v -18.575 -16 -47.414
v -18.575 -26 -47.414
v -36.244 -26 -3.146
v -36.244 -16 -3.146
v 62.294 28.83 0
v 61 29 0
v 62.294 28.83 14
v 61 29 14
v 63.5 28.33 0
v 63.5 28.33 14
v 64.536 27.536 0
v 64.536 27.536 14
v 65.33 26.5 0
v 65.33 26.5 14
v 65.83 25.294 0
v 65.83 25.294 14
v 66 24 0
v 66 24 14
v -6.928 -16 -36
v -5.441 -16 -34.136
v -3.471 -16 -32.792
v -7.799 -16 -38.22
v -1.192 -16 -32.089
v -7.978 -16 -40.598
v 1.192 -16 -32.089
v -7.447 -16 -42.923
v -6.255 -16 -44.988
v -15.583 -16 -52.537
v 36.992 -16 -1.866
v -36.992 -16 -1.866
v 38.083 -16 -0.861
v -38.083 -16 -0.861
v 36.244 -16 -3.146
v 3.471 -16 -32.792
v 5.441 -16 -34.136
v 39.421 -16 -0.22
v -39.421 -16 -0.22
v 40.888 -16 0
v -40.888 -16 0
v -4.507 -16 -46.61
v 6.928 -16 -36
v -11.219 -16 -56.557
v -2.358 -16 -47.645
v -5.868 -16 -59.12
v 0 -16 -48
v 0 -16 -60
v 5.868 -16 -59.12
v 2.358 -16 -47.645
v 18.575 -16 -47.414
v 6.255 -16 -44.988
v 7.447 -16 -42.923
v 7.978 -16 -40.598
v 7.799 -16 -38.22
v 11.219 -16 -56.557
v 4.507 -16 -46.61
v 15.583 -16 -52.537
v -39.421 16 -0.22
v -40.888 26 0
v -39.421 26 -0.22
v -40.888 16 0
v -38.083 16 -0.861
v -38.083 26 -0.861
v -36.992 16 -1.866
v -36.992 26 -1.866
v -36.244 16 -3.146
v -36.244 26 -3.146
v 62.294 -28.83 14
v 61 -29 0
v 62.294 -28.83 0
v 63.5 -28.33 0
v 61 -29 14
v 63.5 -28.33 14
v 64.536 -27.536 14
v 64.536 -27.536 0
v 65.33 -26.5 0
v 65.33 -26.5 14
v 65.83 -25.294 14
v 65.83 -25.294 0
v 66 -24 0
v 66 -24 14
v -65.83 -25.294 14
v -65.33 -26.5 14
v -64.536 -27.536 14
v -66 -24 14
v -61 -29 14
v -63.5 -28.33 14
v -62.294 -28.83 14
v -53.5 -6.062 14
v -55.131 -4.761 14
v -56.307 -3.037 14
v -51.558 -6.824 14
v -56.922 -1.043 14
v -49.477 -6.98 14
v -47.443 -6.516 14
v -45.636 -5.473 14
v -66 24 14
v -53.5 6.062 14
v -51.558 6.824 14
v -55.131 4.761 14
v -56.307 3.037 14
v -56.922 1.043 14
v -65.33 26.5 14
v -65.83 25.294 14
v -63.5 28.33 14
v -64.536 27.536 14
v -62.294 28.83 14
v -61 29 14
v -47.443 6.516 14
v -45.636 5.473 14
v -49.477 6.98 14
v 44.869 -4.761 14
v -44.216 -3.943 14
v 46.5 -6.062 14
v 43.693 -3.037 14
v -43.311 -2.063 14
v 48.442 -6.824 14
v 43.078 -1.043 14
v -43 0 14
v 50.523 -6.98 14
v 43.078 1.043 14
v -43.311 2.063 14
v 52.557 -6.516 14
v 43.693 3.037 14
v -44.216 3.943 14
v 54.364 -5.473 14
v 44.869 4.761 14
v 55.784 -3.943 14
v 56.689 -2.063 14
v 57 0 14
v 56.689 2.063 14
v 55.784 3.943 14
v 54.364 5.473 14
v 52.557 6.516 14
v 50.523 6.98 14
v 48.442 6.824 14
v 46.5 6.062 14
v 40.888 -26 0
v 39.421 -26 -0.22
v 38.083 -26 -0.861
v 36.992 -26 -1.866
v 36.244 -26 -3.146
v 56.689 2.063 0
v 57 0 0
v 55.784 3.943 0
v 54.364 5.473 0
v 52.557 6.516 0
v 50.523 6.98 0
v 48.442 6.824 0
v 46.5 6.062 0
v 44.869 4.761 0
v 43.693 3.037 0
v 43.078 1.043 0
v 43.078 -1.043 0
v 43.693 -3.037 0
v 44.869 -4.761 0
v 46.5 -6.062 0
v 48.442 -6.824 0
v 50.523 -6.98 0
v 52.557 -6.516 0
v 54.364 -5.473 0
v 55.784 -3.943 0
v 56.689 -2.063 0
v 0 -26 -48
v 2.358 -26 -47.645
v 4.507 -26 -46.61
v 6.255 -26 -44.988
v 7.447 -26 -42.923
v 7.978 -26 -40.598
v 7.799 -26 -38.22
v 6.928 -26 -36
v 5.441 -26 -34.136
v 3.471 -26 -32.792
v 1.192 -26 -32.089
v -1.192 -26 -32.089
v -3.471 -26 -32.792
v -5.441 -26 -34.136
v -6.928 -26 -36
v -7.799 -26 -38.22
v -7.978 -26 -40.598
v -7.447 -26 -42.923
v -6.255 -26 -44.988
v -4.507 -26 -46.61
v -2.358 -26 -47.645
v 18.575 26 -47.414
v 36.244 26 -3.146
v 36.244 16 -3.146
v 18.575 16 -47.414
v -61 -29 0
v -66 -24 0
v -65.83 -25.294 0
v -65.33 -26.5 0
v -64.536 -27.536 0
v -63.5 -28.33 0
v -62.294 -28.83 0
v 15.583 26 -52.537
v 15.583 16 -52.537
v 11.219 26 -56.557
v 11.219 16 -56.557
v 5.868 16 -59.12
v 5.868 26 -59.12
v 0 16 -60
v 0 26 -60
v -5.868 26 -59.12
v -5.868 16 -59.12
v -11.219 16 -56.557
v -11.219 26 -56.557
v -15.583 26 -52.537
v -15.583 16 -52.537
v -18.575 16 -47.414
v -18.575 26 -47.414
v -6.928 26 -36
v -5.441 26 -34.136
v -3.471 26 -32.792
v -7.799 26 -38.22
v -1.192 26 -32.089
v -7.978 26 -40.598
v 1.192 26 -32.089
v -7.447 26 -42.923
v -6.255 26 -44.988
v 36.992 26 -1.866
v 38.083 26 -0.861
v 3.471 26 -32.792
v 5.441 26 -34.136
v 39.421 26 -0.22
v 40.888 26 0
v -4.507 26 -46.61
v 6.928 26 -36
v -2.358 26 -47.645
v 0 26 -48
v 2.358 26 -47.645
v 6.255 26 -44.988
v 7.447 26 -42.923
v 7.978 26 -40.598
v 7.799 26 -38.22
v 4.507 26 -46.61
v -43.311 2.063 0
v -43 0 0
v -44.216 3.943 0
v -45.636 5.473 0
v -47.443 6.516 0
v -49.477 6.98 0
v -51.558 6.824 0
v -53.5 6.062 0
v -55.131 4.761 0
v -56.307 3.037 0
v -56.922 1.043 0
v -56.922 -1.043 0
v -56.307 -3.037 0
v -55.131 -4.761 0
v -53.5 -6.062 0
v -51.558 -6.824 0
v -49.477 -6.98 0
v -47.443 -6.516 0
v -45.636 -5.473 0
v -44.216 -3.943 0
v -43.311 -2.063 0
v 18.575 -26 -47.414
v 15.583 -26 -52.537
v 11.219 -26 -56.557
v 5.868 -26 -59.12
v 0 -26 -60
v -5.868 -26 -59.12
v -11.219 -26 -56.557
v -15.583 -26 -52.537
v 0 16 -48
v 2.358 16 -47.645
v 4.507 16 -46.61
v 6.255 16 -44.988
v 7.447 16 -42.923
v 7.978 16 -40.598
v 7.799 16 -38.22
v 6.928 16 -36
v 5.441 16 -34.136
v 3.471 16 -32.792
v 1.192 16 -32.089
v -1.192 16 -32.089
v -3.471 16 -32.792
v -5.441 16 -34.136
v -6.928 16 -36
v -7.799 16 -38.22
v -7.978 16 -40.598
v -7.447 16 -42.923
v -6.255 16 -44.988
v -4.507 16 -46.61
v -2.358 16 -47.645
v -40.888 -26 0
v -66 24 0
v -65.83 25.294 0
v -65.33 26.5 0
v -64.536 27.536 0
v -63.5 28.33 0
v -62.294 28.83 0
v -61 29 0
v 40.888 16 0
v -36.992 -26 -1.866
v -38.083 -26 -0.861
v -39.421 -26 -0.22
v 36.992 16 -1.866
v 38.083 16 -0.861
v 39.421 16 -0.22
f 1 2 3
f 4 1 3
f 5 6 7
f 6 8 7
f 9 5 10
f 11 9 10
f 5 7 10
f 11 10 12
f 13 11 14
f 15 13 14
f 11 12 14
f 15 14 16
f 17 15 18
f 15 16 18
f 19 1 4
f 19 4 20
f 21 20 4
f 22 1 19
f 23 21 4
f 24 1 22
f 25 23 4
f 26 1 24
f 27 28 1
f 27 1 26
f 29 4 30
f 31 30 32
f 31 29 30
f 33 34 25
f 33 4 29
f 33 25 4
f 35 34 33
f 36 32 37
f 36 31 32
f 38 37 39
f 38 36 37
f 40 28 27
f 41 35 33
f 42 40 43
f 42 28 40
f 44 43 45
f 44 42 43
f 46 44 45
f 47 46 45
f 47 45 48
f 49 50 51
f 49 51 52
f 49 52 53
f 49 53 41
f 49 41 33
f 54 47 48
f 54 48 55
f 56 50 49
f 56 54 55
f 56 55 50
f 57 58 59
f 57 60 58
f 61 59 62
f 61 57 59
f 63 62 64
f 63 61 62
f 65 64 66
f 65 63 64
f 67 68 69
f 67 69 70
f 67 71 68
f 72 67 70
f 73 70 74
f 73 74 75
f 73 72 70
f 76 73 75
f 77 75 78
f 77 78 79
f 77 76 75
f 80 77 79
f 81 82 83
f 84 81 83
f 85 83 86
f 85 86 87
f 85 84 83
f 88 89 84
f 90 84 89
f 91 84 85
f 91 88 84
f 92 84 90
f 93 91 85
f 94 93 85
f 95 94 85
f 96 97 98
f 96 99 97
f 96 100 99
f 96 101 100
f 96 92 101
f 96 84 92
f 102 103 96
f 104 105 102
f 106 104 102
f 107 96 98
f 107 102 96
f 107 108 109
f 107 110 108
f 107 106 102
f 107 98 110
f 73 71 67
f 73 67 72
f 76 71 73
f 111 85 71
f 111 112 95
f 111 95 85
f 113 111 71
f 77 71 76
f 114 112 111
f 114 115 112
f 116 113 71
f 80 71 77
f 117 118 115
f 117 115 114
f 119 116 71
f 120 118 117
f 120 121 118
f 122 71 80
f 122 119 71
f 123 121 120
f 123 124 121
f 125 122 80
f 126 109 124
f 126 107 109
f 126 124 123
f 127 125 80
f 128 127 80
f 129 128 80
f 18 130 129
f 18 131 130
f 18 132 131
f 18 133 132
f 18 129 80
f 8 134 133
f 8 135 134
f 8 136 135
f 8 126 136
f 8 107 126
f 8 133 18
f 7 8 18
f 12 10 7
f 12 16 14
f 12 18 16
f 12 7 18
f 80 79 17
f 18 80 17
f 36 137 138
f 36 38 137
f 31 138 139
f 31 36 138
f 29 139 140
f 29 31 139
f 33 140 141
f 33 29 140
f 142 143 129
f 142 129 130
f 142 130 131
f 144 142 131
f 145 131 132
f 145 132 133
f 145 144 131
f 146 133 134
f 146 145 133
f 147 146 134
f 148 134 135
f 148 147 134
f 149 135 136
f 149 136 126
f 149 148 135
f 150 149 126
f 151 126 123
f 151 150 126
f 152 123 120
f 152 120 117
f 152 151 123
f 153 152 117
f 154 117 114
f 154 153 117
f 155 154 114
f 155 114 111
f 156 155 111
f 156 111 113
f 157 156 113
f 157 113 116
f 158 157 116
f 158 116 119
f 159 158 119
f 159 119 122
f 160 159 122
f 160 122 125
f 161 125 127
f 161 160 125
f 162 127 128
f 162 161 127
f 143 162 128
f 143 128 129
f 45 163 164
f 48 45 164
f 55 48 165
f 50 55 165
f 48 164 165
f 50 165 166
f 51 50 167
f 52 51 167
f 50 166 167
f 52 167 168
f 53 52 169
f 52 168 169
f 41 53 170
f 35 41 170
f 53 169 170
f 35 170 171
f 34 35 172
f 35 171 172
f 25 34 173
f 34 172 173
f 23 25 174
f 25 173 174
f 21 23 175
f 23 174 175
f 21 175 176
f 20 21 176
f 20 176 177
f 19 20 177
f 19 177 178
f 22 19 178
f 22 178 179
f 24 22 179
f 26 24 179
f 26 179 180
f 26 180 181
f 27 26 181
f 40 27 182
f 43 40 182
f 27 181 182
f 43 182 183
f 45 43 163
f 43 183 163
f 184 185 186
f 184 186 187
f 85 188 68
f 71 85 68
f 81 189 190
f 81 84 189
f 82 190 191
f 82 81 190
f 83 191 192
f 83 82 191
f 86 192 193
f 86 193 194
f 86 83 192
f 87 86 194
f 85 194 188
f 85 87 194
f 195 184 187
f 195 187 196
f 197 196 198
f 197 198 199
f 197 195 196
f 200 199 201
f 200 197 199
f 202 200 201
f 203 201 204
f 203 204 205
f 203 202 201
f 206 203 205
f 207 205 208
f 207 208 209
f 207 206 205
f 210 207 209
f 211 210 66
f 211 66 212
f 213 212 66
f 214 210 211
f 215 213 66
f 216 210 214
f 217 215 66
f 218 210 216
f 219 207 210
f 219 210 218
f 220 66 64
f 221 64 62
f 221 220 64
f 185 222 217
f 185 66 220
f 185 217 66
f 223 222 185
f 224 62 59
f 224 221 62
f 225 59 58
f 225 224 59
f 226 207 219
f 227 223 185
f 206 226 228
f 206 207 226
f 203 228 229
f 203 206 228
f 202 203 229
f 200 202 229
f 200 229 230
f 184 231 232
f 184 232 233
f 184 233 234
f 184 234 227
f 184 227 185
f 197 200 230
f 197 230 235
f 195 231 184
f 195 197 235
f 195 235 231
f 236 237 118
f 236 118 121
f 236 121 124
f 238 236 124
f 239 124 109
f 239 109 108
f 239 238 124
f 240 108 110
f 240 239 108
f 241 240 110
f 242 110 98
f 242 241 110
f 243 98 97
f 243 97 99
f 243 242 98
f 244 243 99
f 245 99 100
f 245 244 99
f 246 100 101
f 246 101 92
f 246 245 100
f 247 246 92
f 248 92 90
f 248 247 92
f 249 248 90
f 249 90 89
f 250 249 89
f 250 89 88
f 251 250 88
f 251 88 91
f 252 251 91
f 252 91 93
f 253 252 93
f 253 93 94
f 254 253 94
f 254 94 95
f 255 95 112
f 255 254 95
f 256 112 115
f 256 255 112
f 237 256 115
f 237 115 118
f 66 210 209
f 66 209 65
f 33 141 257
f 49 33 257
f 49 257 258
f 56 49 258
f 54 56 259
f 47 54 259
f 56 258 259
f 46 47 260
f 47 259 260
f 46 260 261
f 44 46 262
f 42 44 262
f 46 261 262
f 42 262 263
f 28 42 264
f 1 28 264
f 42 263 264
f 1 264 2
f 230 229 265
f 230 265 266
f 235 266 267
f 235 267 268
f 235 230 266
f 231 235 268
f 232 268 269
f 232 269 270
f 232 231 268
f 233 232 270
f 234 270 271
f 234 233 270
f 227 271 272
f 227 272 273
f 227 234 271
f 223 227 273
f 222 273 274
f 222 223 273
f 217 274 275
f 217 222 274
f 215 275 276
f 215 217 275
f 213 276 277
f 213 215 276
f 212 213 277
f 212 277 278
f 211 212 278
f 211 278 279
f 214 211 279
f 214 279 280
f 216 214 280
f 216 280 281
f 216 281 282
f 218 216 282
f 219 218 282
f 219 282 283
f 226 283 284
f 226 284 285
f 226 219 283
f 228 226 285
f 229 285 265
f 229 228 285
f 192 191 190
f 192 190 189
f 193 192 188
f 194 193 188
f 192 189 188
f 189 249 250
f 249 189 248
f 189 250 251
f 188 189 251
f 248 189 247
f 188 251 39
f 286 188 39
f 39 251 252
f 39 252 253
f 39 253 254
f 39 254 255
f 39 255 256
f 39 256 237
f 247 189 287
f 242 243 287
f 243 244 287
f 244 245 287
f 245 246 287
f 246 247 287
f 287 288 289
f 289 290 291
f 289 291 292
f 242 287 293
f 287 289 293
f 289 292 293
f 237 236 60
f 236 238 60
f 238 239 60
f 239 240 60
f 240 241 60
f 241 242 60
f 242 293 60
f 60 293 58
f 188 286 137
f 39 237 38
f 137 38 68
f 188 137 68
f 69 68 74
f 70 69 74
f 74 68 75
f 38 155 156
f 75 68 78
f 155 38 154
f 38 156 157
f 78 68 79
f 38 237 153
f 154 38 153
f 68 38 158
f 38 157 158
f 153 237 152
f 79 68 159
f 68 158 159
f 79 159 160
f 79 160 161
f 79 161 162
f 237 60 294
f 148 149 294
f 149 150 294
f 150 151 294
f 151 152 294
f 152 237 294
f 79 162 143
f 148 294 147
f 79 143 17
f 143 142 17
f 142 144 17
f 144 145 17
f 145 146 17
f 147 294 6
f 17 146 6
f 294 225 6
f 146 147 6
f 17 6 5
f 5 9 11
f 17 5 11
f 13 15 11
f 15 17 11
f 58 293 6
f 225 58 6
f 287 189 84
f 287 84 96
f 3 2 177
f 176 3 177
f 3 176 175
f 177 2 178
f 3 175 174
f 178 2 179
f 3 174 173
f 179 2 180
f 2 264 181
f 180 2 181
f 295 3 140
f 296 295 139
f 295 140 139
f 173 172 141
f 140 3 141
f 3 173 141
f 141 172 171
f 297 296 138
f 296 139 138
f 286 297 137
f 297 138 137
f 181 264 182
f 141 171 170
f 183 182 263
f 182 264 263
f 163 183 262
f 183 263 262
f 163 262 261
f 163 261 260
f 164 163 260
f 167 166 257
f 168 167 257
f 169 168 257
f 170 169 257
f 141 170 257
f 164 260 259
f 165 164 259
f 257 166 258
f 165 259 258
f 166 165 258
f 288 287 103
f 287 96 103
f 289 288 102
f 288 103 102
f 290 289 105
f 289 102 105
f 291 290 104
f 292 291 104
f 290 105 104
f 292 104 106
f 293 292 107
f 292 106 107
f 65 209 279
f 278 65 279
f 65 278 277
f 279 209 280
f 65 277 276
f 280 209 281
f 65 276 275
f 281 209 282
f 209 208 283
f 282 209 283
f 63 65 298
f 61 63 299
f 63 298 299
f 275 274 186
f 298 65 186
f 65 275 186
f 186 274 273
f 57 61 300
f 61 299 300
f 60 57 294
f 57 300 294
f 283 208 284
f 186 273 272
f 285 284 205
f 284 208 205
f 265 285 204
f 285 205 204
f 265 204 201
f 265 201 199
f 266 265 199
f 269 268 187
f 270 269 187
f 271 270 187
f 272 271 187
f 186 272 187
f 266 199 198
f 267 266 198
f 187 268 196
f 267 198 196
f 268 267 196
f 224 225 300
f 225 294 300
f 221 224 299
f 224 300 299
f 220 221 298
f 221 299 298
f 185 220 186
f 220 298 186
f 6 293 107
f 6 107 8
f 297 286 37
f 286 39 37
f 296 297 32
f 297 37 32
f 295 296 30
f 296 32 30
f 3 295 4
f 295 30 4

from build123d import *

# Parameters (mm, degrees)
SKETCH1_W            = 132
SKETCH1_H            = 58
SKETCH1_R            = 7
BOSS_EXTRUDE1_DEPTH  = 14
FILLET1_R            = 5
SKETCH2_R            = 8
BOSS_EXTRUDE2_DEPTH  = 10
FILLET2_R            = 5
FILLET2_OF_MIRROR1_R = 5


with BuildPart() as part:
    # Sketch1 → Boss-Extrude1 (new body)
    with BuildSketch(Plane.XY):
        Rectangle(SKETCH1_W, SKETCH1_H)
        with Locations((-50, 0)):
            Circle(SKETCH1_R, mode=Mode.SUBTRACT)
        with Locations((50, 0)):
            Circle(SKETCH1_R, mode=Mode.SUBTRACT)
    extrude(amount=BOSS_EXTRUDE1_DEPTH)

    # Fillet1
    fillet1_edges = [part.edges().sort_by_distance(p)[0] for p in [
        (66, -29, 7),
        (-66, -29, 7),
        (-66, 29, 7),
        (66, 29, 7),
    ]]
    fillet(fillet1_edges, radius=FILLET1_R)

    # Sketch2 → Boss-Extrude2 (add)
    with BuildSketch(Plane(origin=(0, -26, 0), x_dir=(-1, 0, 0), z_dir=(0, -1, 0))):
        with BuildLine():
            Line((-37.5, 0), (-18.575020612, 47.414081823))
            ThreePointArc((-18.575020612, 47.414081823), (0, 60), (18.575020612, 47.414081823))
            Line((18.575020612, 47.414081823), (37.5, 0))
            Line((37.5, 0), (-37.5, 0))
        make_face()
        with Locations(Location((0, 40, 0), (0, 0, 90))):
            Circle(SKETCH2_R, mode=Mode.SUBTRACT)
    boss_extrude2 = extrude(amount=-BOSS_EXTRUDE2_DEPTH)

    # Fillet2
    fillet2_edges = [part.edges().sort_by_distance(p)[0] for p in [
        (-37.5, -21, 0),
        (37.5, -21, 0),
    ]]
    fillet(fillet2_edges, radius=FILLET2_R)

    # Mirror1: Boss-Extrude2 across plane
    add(boss_extrude2.mirror(Plane.ZX))

    # Fillet2 of Mirror1
    fillet2_of_mirror1_edges = [part.edges().sort_by_distance(p)[0] for p in [
        (-37.5, 21, 0),
        (37.5, 21, 0),
    ]]
    fillet(fillet2_of_mirror1_edges, radius=FILLET2_OF_MIRROR1_R)


solid = part.part
